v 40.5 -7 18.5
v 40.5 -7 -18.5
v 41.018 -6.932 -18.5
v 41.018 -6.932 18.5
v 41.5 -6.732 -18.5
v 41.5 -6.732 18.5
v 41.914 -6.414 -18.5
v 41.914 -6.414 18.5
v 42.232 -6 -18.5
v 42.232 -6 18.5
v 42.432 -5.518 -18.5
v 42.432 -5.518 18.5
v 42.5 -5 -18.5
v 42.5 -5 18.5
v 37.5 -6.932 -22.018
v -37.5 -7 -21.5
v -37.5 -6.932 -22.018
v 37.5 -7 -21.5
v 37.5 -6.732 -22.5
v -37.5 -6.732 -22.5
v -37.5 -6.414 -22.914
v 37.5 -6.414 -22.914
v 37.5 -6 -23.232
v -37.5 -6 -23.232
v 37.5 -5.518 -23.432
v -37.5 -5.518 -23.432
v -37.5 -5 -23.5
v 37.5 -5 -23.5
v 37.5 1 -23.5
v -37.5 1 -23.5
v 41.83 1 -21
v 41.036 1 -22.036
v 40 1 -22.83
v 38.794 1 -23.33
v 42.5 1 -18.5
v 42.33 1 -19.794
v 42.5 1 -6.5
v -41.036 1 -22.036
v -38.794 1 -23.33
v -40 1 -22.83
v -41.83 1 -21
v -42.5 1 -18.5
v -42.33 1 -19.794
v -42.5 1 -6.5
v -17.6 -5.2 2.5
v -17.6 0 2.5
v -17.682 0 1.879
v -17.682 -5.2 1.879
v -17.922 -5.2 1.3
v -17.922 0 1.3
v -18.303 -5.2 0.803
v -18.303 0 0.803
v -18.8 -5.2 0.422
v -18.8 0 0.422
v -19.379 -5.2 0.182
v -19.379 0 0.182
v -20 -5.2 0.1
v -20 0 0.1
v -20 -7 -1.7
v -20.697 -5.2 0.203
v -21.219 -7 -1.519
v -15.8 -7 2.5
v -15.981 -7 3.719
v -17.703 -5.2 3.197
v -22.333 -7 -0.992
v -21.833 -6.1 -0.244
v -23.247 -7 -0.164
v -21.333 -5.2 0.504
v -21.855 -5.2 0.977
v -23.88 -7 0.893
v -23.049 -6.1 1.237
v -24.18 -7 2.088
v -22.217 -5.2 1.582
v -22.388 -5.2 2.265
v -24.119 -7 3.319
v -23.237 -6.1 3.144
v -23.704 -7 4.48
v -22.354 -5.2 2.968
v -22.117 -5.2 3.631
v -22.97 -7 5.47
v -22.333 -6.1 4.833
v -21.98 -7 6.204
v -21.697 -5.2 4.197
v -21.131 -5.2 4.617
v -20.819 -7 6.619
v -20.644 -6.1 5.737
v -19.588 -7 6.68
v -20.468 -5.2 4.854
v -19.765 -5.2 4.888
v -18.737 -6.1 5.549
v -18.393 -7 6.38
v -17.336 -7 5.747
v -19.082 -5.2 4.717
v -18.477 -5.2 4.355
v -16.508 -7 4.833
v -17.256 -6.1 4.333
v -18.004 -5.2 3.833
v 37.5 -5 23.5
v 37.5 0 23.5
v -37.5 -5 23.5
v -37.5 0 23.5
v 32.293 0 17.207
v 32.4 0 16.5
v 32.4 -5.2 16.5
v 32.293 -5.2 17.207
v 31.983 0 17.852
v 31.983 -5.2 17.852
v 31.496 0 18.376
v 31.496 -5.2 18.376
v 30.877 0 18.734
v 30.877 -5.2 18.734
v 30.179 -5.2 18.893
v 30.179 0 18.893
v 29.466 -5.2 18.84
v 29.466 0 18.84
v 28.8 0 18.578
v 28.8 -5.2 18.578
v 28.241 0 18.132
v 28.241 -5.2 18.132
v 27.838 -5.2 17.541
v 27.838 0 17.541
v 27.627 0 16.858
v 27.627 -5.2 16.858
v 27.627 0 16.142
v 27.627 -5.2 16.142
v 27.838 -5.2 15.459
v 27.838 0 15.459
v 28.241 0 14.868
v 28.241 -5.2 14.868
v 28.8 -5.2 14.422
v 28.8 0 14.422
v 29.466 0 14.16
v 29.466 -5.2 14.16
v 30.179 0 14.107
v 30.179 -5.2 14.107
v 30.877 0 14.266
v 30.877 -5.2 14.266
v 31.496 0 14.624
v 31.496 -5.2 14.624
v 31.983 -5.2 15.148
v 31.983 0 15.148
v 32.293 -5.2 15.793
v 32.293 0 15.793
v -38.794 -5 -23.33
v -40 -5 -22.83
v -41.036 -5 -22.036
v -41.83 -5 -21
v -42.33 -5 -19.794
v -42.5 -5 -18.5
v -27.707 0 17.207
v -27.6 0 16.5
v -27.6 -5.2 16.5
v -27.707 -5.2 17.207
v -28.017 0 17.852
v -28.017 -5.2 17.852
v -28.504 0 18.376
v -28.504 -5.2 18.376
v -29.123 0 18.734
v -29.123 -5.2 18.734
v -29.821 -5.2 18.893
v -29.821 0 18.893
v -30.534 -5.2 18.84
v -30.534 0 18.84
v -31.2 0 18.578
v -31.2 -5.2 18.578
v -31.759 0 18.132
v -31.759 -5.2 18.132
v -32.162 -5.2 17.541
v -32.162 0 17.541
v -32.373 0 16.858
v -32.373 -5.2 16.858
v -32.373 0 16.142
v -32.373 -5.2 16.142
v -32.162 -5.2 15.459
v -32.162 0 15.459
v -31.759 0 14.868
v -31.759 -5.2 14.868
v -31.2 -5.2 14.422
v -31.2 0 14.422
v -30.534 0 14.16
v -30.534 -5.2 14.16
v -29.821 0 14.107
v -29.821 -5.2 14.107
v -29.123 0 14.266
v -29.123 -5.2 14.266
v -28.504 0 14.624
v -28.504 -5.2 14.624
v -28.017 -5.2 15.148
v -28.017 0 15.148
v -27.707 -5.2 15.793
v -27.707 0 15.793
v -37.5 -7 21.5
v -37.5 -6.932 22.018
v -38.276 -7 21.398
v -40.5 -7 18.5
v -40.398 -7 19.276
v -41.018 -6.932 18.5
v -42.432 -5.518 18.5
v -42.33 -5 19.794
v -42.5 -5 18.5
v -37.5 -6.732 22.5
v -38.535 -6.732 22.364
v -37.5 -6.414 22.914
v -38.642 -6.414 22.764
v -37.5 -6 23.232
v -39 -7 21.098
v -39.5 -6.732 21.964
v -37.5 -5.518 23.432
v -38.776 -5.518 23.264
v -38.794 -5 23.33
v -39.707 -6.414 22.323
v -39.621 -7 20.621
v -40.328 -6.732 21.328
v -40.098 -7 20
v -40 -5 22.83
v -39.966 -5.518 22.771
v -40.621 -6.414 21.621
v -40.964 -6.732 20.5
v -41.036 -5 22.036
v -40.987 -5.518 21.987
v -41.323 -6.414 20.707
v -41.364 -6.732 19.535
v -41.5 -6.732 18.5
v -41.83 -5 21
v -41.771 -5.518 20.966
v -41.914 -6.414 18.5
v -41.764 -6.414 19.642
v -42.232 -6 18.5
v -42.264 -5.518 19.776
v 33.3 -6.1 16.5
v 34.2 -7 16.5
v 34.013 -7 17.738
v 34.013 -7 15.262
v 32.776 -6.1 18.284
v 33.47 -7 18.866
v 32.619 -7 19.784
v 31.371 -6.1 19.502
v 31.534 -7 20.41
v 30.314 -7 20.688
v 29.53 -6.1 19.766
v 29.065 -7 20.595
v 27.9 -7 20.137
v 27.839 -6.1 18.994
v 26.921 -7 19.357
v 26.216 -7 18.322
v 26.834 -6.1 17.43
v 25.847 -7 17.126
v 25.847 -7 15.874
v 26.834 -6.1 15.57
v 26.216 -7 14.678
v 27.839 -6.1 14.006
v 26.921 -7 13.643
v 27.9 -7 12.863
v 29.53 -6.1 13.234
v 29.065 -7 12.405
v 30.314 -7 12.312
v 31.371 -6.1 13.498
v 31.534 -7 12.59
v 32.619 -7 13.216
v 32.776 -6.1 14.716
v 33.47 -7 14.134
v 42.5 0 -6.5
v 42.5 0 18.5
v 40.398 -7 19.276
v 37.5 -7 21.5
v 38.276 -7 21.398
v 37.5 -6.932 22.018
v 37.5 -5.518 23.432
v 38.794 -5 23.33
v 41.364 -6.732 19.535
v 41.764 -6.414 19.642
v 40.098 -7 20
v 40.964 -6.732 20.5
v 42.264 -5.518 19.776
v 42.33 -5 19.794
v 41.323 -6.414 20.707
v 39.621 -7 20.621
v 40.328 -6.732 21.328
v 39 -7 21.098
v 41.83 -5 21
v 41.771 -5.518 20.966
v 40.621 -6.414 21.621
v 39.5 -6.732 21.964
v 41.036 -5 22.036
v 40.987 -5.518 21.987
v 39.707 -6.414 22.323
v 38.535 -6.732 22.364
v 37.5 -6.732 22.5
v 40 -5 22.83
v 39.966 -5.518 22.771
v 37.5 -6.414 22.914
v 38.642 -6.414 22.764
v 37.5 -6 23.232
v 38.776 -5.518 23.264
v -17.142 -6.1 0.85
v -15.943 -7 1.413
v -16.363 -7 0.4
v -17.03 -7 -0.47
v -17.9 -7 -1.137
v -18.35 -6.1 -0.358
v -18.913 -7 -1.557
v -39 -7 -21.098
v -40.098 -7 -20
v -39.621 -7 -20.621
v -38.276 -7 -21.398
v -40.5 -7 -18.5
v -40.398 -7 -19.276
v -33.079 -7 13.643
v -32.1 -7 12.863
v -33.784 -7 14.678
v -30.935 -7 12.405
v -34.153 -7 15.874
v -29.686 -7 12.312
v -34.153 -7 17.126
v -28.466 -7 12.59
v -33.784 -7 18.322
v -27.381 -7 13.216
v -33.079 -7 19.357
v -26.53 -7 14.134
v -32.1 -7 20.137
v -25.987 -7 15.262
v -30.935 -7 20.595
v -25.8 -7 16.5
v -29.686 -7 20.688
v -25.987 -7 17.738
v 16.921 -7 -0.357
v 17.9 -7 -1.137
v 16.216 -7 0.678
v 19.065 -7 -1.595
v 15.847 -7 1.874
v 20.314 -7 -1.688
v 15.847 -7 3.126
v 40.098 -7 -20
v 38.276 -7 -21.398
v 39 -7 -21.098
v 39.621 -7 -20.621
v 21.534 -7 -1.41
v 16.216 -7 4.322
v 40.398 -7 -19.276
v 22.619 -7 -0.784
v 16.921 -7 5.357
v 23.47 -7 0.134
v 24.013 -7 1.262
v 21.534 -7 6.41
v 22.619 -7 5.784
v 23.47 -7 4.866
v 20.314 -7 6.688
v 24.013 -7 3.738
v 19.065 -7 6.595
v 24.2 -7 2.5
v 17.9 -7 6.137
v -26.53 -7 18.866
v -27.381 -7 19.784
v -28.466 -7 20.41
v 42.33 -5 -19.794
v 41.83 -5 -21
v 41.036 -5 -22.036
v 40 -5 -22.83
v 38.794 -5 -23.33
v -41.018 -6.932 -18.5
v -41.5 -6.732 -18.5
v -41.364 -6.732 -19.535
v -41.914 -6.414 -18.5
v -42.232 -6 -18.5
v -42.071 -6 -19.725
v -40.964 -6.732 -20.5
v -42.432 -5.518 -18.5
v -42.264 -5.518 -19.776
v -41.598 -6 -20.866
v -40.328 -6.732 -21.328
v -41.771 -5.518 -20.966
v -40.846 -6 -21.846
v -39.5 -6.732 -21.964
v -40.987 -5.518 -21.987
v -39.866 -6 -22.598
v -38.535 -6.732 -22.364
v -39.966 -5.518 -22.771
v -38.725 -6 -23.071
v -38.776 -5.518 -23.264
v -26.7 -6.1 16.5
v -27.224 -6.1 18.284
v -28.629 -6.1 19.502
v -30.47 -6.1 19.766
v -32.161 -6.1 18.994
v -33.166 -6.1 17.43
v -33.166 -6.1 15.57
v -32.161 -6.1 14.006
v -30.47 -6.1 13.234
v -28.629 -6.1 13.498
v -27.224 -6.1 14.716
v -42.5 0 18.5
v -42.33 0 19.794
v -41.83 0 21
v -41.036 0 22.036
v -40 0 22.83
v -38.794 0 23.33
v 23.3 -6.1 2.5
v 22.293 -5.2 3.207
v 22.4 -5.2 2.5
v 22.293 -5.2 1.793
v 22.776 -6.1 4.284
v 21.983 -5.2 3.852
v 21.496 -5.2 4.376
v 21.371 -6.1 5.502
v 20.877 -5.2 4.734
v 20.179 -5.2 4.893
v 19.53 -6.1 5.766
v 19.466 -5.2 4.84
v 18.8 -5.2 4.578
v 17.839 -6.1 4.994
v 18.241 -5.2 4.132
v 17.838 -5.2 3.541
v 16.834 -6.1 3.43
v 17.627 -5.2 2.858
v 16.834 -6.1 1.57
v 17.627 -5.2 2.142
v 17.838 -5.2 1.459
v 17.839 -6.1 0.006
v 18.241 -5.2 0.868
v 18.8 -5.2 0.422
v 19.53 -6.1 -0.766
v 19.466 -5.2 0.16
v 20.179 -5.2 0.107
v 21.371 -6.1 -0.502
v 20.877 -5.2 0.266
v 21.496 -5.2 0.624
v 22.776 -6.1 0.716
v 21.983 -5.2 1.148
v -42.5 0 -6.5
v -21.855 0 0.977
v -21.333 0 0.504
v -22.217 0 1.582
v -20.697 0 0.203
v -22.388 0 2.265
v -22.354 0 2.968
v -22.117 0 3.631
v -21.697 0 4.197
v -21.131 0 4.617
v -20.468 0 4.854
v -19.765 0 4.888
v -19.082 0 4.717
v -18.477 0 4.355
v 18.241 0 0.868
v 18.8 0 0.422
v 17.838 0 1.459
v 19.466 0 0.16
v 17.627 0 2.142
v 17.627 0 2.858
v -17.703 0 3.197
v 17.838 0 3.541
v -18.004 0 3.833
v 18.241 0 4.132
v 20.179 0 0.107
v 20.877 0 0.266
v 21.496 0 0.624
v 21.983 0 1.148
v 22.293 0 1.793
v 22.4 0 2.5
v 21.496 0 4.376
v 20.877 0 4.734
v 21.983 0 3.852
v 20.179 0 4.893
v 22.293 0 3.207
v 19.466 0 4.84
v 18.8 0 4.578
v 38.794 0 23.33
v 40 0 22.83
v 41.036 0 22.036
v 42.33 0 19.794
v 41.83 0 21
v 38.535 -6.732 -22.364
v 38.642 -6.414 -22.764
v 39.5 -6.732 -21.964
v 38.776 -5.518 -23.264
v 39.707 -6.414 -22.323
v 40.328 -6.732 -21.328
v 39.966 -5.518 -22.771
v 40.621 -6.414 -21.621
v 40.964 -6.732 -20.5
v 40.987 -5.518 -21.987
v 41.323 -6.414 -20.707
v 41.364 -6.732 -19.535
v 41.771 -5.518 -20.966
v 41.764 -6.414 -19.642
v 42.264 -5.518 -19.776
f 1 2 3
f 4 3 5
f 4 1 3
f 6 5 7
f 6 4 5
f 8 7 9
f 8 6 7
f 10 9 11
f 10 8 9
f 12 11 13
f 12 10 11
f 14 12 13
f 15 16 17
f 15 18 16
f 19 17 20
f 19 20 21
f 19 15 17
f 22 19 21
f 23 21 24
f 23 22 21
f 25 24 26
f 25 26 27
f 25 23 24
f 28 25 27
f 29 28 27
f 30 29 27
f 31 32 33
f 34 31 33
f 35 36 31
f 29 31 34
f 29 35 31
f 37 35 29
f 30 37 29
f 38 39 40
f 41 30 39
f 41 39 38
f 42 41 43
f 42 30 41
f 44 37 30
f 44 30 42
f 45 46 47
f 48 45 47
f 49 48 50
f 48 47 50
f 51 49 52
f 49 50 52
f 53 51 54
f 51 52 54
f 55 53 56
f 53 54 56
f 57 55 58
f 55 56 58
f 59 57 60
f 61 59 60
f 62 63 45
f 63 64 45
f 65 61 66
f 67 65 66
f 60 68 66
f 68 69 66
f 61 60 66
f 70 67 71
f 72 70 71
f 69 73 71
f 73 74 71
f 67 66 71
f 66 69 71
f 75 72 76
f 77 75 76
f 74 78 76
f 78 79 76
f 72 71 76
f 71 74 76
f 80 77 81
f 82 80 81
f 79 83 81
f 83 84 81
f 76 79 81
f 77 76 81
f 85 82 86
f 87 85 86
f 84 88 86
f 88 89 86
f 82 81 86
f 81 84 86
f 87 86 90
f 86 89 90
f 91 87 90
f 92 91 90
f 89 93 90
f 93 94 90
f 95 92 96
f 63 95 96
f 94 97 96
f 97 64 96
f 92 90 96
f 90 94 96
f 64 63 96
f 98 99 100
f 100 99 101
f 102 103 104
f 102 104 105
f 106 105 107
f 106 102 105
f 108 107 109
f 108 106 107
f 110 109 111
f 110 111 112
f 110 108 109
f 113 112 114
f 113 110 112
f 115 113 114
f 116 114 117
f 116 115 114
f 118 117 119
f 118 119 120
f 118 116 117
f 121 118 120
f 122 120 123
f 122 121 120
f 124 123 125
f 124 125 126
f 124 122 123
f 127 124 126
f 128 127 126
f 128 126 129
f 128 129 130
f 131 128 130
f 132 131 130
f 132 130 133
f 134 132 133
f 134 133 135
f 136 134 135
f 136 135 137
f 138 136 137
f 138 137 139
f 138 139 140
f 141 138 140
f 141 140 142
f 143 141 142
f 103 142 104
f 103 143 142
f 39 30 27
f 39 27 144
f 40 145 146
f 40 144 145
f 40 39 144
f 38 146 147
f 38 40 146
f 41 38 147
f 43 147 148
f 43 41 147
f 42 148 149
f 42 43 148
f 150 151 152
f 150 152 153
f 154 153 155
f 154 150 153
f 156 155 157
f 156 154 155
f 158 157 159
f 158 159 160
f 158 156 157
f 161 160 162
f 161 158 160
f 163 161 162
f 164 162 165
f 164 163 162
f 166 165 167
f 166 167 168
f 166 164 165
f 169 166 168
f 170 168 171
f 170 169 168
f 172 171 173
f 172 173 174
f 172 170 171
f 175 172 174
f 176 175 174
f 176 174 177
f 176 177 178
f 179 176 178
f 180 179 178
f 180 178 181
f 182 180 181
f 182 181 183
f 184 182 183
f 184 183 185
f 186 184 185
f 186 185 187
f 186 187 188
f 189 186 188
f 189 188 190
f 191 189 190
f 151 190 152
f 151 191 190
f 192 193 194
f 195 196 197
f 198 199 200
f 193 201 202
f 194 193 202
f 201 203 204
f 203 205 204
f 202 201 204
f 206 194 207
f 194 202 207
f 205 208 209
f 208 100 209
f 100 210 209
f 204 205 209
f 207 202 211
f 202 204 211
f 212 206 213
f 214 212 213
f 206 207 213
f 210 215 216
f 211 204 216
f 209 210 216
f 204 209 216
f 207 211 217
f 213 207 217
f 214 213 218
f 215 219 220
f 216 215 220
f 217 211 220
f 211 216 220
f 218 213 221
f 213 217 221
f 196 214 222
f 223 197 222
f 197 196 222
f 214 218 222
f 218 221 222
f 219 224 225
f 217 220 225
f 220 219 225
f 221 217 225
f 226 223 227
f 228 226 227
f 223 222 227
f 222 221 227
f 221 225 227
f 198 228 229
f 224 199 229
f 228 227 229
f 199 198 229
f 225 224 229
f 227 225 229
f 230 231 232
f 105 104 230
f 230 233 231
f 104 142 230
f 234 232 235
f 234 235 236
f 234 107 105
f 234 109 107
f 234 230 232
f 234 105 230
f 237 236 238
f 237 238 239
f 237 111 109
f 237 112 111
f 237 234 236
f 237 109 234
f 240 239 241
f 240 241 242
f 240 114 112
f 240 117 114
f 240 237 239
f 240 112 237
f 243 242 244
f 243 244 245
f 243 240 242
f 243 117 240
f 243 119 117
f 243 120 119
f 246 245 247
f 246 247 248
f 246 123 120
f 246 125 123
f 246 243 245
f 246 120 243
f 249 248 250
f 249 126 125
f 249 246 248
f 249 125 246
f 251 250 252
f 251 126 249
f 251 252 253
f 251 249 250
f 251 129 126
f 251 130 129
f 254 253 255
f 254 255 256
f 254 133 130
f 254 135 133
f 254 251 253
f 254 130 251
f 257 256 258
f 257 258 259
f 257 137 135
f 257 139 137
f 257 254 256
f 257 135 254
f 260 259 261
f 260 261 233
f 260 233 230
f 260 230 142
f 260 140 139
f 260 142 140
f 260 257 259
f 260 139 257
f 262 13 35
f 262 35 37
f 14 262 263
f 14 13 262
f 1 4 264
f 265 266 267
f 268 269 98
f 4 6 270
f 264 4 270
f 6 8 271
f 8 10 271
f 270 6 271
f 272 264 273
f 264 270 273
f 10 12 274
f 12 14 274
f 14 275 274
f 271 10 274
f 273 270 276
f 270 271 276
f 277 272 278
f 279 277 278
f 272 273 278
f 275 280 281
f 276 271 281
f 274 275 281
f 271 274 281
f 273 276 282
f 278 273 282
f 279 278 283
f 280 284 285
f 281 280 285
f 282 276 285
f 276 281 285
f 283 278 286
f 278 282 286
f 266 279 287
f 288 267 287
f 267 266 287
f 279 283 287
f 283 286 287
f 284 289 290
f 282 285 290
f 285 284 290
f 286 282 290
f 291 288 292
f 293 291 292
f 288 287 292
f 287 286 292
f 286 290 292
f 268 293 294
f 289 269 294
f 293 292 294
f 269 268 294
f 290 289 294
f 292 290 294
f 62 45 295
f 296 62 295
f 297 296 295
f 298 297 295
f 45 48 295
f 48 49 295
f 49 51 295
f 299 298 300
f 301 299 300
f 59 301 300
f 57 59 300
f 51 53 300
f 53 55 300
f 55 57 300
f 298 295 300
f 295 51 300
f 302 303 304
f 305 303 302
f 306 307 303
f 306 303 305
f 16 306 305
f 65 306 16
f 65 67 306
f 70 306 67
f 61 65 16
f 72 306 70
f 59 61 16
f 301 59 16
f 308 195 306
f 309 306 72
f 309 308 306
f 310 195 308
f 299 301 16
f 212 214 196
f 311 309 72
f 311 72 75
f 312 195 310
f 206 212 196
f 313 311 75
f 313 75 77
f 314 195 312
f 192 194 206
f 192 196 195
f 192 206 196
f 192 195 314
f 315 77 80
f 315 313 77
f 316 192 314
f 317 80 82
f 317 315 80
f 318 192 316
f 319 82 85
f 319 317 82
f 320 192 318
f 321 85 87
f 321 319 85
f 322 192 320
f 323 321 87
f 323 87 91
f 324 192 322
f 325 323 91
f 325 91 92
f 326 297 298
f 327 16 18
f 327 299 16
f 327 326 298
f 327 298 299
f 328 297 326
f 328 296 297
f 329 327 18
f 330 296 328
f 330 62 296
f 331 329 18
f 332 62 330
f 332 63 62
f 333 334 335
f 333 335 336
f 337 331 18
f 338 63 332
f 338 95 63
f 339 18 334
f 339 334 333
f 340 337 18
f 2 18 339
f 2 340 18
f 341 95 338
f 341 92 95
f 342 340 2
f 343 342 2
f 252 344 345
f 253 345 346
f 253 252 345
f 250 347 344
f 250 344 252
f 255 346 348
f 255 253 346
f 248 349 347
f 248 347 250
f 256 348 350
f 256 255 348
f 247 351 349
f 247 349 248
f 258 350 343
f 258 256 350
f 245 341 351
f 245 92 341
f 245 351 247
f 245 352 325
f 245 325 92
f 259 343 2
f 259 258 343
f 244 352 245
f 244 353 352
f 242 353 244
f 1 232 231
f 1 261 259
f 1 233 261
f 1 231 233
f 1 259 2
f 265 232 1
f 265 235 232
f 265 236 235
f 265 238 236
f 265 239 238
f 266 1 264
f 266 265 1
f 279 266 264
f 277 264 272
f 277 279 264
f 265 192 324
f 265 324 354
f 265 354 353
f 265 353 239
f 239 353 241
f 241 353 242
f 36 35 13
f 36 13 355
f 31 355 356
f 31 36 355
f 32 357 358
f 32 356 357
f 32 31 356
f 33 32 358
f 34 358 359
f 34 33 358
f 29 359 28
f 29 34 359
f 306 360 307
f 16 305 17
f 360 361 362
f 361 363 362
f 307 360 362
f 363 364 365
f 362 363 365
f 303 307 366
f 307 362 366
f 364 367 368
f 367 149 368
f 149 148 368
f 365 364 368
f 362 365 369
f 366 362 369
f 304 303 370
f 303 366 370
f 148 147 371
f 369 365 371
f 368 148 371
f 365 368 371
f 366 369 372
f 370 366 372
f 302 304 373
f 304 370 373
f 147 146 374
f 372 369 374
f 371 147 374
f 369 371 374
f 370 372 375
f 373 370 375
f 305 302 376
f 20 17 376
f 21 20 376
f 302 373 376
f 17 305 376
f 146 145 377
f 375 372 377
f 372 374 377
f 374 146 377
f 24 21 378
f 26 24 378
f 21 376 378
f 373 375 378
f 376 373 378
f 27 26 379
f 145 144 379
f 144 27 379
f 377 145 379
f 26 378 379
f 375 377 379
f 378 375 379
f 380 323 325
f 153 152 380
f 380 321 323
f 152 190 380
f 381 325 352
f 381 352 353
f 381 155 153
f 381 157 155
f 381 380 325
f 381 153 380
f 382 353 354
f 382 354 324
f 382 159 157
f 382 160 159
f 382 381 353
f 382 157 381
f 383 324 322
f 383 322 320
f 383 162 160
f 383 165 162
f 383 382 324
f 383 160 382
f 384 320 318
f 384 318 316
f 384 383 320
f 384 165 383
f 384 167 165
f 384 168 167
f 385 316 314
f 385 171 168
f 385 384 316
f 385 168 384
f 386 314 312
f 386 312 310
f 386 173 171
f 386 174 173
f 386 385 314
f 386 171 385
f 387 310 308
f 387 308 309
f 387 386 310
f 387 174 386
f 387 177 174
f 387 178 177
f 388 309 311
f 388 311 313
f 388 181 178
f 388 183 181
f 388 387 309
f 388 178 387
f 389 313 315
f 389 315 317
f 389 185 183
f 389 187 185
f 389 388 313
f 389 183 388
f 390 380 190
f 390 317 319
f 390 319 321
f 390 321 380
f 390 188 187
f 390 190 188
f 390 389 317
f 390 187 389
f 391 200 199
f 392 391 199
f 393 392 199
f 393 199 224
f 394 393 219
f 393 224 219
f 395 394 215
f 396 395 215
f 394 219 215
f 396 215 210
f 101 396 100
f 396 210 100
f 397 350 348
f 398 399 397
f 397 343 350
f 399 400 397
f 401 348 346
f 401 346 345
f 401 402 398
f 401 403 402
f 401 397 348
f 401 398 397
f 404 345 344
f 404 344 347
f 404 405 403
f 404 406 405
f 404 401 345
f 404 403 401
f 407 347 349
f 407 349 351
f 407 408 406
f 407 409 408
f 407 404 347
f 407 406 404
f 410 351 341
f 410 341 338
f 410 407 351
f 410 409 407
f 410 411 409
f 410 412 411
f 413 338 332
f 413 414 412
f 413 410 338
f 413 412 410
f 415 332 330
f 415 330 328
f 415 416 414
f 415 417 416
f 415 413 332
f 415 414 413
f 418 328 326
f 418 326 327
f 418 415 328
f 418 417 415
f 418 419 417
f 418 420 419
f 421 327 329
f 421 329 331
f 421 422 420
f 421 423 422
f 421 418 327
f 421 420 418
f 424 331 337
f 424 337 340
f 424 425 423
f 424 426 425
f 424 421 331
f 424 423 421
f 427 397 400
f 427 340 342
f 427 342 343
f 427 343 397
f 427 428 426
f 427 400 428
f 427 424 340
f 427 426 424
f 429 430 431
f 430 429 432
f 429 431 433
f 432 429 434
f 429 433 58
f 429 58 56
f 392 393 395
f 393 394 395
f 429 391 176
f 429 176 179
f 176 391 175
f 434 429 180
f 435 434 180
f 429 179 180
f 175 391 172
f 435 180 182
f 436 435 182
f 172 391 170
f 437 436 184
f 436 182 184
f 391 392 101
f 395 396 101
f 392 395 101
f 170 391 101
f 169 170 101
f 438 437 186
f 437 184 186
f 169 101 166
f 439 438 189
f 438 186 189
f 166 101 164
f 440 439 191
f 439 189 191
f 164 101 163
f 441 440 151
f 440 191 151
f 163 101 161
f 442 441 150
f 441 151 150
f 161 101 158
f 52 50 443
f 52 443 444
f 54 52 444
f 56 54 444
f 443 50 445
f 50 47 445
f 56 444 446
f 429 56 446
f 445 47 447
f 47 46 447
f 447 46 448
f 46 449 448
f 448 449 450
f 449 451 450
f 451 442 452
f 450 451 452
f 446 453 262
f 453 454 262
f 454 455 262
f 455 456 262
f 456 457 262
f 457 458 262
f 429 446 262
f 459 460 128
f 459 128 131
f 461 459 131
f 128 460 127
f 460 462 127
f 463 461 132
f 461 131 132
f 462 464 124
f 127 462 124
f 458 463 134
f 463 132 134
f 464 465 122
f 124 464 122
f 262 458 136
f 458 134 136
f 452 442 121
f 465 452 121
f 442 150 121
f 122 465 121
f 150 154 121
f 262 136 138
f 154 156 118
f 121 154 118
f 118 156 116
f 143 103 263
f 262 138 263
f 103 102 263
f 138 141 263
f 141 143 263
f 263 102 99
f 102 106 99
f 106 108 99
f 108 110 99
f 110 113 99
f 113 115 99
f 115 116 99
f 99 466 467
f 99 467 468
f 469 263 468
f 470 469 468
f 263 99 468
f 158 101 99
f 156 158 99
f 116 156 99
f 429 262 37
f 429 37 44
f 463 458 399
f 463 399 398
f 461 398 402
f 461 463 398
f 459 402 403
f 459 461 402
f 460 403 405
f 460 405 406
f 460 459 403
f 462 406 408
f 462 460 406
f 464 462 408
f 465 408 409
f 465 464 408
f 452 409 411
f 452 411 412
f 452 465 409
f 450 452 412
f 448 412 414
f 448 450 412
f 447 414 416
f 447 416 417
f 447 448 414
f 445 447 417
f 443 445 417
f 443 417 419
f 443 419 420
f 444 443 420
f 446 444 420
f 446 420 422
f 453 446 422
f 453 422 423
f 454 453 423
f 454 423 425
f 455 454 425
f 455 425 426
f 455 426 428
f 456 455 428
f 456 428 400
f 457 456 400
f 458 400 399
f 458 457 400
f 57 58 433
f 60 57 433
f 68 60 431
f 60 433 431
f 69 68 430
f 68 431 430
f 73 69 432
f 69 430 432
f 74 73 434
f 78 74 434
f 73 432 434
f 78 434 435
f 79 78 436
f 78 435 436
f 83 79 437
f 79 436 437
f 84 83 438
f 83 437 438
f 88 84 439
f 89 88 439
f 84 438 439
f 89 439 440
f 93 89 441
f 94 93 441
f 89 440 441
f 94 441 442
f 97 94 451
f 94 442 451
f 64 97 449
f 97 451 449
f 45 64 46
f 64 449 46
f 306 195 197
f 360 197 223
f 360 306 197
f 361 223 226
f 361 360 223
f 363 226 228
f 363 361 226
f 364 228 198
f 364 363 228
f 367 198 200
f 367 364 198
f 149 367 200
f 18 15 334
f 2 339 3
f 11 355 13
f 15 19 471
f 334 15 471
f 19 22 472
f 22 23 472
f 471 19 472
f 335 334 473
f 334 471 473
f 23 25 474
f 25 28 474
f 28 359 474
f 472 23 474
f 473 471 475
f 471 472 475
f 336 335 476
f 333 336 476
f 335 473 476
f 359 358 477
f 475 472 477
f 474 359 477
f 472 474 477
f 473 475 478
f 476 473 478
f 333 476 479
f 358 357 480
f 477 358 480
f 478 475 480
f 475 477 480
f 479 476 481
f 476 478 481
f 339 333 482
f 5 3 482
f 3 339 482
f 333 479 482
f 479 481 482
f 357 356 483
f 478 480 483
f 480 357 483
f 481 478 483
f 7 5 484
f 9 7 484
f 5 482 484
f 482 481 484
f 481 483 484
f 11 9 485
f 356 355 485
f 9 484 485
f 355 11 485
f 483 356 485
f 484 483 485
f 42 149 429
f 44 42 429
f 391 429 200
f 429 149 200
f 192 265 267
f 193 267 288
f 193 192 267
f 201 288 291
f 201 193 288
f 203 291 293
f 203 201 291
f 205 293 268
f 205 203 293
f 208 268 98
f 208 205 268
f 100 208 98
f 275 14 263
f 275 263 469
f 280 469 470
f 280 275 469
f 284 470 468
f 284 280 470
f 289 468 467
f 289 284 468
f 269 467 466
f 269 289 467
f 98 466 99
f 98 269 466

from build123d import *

# Parameters (mm, degrees)
F0_R     = 2.4
F1_DEPTH = 7
F2_W     = 85
F2_H     = 17
F3_DEPTH = 1
F4_R     = 5
F5_R     = 2
F6_SIZE  = 1.8


with BuildPart() as f1:
    # F0 (on Front) → F1 (new body)
    with BuildSketch(Plane.XZ):
        Polygon((42.5, -23.5), (42.5, 23.5), (-42.5, 23.5), (-42.5, -23.5), (-20, -23.5), align=None)
        with BuildLine():
            ThreePointArc((-17.6, 2.5), (-18.3029437252, 0.8029437252), (-20, 0.1))
            ThreePointArc((-20, 0.1), (-21.6970562748, 4.1970562748), (-17.6, 2.5))
        make_face(mode=Mode.SUBTRACT)
        with Locations((-30, 16.5)):
            Circle(F0_R, mode=Mode.SUBTRACT)
        with Locations((20, 2.5)):
            Circle(F0_R, mode=Mode.SUBTRACT)
        with Locations((30, 16.5)):
            Circle(F0_R, mode=Mode.SUBTRACT)
    extrude(amount=F1_DEPTH)

    # F2 (on face) → F3 (join)
    with BuildSketch(Plane(origin=(0, 0, 0), x_dir=(-1, 0, 0), z_dir=(0, 1, 0))):
        with Locations((0, -15)):
            Rectangle(F2_W, F2_H)
    extrude(amount=F3_DEPTH)

    # F4
    f4_edges = [f1.edges().sort_by_distance(p)[0] for p in [
        (42.5, -3.5, 23.5),
        (-42.5, -3.5, 23.5),
        (42.5, -3, -23.5),
        (-42.5, -3, -23.5),
    ]]
    fillet(f4_edges, radius=F4_R)

    # F5
    f5_edges = [f1.edges().sort_by_distance(p)[0] for p in [
        (0, -7, -23.5),
    ]]
    fillet(f5_edges, radius=F5_R)

    # F6
    f6_edges = [f1.edges().sort_by_distance(p)[0] for p in [
        (17.6, -7, 2.5),
        (27.6, -7, 16.5),
        (-22.4, -7, 2.5),
        (-32.4, -7, 16.5),
    ]]
    chamfer(f6_edges, length=F6_SIZE)


solid = f1.part
